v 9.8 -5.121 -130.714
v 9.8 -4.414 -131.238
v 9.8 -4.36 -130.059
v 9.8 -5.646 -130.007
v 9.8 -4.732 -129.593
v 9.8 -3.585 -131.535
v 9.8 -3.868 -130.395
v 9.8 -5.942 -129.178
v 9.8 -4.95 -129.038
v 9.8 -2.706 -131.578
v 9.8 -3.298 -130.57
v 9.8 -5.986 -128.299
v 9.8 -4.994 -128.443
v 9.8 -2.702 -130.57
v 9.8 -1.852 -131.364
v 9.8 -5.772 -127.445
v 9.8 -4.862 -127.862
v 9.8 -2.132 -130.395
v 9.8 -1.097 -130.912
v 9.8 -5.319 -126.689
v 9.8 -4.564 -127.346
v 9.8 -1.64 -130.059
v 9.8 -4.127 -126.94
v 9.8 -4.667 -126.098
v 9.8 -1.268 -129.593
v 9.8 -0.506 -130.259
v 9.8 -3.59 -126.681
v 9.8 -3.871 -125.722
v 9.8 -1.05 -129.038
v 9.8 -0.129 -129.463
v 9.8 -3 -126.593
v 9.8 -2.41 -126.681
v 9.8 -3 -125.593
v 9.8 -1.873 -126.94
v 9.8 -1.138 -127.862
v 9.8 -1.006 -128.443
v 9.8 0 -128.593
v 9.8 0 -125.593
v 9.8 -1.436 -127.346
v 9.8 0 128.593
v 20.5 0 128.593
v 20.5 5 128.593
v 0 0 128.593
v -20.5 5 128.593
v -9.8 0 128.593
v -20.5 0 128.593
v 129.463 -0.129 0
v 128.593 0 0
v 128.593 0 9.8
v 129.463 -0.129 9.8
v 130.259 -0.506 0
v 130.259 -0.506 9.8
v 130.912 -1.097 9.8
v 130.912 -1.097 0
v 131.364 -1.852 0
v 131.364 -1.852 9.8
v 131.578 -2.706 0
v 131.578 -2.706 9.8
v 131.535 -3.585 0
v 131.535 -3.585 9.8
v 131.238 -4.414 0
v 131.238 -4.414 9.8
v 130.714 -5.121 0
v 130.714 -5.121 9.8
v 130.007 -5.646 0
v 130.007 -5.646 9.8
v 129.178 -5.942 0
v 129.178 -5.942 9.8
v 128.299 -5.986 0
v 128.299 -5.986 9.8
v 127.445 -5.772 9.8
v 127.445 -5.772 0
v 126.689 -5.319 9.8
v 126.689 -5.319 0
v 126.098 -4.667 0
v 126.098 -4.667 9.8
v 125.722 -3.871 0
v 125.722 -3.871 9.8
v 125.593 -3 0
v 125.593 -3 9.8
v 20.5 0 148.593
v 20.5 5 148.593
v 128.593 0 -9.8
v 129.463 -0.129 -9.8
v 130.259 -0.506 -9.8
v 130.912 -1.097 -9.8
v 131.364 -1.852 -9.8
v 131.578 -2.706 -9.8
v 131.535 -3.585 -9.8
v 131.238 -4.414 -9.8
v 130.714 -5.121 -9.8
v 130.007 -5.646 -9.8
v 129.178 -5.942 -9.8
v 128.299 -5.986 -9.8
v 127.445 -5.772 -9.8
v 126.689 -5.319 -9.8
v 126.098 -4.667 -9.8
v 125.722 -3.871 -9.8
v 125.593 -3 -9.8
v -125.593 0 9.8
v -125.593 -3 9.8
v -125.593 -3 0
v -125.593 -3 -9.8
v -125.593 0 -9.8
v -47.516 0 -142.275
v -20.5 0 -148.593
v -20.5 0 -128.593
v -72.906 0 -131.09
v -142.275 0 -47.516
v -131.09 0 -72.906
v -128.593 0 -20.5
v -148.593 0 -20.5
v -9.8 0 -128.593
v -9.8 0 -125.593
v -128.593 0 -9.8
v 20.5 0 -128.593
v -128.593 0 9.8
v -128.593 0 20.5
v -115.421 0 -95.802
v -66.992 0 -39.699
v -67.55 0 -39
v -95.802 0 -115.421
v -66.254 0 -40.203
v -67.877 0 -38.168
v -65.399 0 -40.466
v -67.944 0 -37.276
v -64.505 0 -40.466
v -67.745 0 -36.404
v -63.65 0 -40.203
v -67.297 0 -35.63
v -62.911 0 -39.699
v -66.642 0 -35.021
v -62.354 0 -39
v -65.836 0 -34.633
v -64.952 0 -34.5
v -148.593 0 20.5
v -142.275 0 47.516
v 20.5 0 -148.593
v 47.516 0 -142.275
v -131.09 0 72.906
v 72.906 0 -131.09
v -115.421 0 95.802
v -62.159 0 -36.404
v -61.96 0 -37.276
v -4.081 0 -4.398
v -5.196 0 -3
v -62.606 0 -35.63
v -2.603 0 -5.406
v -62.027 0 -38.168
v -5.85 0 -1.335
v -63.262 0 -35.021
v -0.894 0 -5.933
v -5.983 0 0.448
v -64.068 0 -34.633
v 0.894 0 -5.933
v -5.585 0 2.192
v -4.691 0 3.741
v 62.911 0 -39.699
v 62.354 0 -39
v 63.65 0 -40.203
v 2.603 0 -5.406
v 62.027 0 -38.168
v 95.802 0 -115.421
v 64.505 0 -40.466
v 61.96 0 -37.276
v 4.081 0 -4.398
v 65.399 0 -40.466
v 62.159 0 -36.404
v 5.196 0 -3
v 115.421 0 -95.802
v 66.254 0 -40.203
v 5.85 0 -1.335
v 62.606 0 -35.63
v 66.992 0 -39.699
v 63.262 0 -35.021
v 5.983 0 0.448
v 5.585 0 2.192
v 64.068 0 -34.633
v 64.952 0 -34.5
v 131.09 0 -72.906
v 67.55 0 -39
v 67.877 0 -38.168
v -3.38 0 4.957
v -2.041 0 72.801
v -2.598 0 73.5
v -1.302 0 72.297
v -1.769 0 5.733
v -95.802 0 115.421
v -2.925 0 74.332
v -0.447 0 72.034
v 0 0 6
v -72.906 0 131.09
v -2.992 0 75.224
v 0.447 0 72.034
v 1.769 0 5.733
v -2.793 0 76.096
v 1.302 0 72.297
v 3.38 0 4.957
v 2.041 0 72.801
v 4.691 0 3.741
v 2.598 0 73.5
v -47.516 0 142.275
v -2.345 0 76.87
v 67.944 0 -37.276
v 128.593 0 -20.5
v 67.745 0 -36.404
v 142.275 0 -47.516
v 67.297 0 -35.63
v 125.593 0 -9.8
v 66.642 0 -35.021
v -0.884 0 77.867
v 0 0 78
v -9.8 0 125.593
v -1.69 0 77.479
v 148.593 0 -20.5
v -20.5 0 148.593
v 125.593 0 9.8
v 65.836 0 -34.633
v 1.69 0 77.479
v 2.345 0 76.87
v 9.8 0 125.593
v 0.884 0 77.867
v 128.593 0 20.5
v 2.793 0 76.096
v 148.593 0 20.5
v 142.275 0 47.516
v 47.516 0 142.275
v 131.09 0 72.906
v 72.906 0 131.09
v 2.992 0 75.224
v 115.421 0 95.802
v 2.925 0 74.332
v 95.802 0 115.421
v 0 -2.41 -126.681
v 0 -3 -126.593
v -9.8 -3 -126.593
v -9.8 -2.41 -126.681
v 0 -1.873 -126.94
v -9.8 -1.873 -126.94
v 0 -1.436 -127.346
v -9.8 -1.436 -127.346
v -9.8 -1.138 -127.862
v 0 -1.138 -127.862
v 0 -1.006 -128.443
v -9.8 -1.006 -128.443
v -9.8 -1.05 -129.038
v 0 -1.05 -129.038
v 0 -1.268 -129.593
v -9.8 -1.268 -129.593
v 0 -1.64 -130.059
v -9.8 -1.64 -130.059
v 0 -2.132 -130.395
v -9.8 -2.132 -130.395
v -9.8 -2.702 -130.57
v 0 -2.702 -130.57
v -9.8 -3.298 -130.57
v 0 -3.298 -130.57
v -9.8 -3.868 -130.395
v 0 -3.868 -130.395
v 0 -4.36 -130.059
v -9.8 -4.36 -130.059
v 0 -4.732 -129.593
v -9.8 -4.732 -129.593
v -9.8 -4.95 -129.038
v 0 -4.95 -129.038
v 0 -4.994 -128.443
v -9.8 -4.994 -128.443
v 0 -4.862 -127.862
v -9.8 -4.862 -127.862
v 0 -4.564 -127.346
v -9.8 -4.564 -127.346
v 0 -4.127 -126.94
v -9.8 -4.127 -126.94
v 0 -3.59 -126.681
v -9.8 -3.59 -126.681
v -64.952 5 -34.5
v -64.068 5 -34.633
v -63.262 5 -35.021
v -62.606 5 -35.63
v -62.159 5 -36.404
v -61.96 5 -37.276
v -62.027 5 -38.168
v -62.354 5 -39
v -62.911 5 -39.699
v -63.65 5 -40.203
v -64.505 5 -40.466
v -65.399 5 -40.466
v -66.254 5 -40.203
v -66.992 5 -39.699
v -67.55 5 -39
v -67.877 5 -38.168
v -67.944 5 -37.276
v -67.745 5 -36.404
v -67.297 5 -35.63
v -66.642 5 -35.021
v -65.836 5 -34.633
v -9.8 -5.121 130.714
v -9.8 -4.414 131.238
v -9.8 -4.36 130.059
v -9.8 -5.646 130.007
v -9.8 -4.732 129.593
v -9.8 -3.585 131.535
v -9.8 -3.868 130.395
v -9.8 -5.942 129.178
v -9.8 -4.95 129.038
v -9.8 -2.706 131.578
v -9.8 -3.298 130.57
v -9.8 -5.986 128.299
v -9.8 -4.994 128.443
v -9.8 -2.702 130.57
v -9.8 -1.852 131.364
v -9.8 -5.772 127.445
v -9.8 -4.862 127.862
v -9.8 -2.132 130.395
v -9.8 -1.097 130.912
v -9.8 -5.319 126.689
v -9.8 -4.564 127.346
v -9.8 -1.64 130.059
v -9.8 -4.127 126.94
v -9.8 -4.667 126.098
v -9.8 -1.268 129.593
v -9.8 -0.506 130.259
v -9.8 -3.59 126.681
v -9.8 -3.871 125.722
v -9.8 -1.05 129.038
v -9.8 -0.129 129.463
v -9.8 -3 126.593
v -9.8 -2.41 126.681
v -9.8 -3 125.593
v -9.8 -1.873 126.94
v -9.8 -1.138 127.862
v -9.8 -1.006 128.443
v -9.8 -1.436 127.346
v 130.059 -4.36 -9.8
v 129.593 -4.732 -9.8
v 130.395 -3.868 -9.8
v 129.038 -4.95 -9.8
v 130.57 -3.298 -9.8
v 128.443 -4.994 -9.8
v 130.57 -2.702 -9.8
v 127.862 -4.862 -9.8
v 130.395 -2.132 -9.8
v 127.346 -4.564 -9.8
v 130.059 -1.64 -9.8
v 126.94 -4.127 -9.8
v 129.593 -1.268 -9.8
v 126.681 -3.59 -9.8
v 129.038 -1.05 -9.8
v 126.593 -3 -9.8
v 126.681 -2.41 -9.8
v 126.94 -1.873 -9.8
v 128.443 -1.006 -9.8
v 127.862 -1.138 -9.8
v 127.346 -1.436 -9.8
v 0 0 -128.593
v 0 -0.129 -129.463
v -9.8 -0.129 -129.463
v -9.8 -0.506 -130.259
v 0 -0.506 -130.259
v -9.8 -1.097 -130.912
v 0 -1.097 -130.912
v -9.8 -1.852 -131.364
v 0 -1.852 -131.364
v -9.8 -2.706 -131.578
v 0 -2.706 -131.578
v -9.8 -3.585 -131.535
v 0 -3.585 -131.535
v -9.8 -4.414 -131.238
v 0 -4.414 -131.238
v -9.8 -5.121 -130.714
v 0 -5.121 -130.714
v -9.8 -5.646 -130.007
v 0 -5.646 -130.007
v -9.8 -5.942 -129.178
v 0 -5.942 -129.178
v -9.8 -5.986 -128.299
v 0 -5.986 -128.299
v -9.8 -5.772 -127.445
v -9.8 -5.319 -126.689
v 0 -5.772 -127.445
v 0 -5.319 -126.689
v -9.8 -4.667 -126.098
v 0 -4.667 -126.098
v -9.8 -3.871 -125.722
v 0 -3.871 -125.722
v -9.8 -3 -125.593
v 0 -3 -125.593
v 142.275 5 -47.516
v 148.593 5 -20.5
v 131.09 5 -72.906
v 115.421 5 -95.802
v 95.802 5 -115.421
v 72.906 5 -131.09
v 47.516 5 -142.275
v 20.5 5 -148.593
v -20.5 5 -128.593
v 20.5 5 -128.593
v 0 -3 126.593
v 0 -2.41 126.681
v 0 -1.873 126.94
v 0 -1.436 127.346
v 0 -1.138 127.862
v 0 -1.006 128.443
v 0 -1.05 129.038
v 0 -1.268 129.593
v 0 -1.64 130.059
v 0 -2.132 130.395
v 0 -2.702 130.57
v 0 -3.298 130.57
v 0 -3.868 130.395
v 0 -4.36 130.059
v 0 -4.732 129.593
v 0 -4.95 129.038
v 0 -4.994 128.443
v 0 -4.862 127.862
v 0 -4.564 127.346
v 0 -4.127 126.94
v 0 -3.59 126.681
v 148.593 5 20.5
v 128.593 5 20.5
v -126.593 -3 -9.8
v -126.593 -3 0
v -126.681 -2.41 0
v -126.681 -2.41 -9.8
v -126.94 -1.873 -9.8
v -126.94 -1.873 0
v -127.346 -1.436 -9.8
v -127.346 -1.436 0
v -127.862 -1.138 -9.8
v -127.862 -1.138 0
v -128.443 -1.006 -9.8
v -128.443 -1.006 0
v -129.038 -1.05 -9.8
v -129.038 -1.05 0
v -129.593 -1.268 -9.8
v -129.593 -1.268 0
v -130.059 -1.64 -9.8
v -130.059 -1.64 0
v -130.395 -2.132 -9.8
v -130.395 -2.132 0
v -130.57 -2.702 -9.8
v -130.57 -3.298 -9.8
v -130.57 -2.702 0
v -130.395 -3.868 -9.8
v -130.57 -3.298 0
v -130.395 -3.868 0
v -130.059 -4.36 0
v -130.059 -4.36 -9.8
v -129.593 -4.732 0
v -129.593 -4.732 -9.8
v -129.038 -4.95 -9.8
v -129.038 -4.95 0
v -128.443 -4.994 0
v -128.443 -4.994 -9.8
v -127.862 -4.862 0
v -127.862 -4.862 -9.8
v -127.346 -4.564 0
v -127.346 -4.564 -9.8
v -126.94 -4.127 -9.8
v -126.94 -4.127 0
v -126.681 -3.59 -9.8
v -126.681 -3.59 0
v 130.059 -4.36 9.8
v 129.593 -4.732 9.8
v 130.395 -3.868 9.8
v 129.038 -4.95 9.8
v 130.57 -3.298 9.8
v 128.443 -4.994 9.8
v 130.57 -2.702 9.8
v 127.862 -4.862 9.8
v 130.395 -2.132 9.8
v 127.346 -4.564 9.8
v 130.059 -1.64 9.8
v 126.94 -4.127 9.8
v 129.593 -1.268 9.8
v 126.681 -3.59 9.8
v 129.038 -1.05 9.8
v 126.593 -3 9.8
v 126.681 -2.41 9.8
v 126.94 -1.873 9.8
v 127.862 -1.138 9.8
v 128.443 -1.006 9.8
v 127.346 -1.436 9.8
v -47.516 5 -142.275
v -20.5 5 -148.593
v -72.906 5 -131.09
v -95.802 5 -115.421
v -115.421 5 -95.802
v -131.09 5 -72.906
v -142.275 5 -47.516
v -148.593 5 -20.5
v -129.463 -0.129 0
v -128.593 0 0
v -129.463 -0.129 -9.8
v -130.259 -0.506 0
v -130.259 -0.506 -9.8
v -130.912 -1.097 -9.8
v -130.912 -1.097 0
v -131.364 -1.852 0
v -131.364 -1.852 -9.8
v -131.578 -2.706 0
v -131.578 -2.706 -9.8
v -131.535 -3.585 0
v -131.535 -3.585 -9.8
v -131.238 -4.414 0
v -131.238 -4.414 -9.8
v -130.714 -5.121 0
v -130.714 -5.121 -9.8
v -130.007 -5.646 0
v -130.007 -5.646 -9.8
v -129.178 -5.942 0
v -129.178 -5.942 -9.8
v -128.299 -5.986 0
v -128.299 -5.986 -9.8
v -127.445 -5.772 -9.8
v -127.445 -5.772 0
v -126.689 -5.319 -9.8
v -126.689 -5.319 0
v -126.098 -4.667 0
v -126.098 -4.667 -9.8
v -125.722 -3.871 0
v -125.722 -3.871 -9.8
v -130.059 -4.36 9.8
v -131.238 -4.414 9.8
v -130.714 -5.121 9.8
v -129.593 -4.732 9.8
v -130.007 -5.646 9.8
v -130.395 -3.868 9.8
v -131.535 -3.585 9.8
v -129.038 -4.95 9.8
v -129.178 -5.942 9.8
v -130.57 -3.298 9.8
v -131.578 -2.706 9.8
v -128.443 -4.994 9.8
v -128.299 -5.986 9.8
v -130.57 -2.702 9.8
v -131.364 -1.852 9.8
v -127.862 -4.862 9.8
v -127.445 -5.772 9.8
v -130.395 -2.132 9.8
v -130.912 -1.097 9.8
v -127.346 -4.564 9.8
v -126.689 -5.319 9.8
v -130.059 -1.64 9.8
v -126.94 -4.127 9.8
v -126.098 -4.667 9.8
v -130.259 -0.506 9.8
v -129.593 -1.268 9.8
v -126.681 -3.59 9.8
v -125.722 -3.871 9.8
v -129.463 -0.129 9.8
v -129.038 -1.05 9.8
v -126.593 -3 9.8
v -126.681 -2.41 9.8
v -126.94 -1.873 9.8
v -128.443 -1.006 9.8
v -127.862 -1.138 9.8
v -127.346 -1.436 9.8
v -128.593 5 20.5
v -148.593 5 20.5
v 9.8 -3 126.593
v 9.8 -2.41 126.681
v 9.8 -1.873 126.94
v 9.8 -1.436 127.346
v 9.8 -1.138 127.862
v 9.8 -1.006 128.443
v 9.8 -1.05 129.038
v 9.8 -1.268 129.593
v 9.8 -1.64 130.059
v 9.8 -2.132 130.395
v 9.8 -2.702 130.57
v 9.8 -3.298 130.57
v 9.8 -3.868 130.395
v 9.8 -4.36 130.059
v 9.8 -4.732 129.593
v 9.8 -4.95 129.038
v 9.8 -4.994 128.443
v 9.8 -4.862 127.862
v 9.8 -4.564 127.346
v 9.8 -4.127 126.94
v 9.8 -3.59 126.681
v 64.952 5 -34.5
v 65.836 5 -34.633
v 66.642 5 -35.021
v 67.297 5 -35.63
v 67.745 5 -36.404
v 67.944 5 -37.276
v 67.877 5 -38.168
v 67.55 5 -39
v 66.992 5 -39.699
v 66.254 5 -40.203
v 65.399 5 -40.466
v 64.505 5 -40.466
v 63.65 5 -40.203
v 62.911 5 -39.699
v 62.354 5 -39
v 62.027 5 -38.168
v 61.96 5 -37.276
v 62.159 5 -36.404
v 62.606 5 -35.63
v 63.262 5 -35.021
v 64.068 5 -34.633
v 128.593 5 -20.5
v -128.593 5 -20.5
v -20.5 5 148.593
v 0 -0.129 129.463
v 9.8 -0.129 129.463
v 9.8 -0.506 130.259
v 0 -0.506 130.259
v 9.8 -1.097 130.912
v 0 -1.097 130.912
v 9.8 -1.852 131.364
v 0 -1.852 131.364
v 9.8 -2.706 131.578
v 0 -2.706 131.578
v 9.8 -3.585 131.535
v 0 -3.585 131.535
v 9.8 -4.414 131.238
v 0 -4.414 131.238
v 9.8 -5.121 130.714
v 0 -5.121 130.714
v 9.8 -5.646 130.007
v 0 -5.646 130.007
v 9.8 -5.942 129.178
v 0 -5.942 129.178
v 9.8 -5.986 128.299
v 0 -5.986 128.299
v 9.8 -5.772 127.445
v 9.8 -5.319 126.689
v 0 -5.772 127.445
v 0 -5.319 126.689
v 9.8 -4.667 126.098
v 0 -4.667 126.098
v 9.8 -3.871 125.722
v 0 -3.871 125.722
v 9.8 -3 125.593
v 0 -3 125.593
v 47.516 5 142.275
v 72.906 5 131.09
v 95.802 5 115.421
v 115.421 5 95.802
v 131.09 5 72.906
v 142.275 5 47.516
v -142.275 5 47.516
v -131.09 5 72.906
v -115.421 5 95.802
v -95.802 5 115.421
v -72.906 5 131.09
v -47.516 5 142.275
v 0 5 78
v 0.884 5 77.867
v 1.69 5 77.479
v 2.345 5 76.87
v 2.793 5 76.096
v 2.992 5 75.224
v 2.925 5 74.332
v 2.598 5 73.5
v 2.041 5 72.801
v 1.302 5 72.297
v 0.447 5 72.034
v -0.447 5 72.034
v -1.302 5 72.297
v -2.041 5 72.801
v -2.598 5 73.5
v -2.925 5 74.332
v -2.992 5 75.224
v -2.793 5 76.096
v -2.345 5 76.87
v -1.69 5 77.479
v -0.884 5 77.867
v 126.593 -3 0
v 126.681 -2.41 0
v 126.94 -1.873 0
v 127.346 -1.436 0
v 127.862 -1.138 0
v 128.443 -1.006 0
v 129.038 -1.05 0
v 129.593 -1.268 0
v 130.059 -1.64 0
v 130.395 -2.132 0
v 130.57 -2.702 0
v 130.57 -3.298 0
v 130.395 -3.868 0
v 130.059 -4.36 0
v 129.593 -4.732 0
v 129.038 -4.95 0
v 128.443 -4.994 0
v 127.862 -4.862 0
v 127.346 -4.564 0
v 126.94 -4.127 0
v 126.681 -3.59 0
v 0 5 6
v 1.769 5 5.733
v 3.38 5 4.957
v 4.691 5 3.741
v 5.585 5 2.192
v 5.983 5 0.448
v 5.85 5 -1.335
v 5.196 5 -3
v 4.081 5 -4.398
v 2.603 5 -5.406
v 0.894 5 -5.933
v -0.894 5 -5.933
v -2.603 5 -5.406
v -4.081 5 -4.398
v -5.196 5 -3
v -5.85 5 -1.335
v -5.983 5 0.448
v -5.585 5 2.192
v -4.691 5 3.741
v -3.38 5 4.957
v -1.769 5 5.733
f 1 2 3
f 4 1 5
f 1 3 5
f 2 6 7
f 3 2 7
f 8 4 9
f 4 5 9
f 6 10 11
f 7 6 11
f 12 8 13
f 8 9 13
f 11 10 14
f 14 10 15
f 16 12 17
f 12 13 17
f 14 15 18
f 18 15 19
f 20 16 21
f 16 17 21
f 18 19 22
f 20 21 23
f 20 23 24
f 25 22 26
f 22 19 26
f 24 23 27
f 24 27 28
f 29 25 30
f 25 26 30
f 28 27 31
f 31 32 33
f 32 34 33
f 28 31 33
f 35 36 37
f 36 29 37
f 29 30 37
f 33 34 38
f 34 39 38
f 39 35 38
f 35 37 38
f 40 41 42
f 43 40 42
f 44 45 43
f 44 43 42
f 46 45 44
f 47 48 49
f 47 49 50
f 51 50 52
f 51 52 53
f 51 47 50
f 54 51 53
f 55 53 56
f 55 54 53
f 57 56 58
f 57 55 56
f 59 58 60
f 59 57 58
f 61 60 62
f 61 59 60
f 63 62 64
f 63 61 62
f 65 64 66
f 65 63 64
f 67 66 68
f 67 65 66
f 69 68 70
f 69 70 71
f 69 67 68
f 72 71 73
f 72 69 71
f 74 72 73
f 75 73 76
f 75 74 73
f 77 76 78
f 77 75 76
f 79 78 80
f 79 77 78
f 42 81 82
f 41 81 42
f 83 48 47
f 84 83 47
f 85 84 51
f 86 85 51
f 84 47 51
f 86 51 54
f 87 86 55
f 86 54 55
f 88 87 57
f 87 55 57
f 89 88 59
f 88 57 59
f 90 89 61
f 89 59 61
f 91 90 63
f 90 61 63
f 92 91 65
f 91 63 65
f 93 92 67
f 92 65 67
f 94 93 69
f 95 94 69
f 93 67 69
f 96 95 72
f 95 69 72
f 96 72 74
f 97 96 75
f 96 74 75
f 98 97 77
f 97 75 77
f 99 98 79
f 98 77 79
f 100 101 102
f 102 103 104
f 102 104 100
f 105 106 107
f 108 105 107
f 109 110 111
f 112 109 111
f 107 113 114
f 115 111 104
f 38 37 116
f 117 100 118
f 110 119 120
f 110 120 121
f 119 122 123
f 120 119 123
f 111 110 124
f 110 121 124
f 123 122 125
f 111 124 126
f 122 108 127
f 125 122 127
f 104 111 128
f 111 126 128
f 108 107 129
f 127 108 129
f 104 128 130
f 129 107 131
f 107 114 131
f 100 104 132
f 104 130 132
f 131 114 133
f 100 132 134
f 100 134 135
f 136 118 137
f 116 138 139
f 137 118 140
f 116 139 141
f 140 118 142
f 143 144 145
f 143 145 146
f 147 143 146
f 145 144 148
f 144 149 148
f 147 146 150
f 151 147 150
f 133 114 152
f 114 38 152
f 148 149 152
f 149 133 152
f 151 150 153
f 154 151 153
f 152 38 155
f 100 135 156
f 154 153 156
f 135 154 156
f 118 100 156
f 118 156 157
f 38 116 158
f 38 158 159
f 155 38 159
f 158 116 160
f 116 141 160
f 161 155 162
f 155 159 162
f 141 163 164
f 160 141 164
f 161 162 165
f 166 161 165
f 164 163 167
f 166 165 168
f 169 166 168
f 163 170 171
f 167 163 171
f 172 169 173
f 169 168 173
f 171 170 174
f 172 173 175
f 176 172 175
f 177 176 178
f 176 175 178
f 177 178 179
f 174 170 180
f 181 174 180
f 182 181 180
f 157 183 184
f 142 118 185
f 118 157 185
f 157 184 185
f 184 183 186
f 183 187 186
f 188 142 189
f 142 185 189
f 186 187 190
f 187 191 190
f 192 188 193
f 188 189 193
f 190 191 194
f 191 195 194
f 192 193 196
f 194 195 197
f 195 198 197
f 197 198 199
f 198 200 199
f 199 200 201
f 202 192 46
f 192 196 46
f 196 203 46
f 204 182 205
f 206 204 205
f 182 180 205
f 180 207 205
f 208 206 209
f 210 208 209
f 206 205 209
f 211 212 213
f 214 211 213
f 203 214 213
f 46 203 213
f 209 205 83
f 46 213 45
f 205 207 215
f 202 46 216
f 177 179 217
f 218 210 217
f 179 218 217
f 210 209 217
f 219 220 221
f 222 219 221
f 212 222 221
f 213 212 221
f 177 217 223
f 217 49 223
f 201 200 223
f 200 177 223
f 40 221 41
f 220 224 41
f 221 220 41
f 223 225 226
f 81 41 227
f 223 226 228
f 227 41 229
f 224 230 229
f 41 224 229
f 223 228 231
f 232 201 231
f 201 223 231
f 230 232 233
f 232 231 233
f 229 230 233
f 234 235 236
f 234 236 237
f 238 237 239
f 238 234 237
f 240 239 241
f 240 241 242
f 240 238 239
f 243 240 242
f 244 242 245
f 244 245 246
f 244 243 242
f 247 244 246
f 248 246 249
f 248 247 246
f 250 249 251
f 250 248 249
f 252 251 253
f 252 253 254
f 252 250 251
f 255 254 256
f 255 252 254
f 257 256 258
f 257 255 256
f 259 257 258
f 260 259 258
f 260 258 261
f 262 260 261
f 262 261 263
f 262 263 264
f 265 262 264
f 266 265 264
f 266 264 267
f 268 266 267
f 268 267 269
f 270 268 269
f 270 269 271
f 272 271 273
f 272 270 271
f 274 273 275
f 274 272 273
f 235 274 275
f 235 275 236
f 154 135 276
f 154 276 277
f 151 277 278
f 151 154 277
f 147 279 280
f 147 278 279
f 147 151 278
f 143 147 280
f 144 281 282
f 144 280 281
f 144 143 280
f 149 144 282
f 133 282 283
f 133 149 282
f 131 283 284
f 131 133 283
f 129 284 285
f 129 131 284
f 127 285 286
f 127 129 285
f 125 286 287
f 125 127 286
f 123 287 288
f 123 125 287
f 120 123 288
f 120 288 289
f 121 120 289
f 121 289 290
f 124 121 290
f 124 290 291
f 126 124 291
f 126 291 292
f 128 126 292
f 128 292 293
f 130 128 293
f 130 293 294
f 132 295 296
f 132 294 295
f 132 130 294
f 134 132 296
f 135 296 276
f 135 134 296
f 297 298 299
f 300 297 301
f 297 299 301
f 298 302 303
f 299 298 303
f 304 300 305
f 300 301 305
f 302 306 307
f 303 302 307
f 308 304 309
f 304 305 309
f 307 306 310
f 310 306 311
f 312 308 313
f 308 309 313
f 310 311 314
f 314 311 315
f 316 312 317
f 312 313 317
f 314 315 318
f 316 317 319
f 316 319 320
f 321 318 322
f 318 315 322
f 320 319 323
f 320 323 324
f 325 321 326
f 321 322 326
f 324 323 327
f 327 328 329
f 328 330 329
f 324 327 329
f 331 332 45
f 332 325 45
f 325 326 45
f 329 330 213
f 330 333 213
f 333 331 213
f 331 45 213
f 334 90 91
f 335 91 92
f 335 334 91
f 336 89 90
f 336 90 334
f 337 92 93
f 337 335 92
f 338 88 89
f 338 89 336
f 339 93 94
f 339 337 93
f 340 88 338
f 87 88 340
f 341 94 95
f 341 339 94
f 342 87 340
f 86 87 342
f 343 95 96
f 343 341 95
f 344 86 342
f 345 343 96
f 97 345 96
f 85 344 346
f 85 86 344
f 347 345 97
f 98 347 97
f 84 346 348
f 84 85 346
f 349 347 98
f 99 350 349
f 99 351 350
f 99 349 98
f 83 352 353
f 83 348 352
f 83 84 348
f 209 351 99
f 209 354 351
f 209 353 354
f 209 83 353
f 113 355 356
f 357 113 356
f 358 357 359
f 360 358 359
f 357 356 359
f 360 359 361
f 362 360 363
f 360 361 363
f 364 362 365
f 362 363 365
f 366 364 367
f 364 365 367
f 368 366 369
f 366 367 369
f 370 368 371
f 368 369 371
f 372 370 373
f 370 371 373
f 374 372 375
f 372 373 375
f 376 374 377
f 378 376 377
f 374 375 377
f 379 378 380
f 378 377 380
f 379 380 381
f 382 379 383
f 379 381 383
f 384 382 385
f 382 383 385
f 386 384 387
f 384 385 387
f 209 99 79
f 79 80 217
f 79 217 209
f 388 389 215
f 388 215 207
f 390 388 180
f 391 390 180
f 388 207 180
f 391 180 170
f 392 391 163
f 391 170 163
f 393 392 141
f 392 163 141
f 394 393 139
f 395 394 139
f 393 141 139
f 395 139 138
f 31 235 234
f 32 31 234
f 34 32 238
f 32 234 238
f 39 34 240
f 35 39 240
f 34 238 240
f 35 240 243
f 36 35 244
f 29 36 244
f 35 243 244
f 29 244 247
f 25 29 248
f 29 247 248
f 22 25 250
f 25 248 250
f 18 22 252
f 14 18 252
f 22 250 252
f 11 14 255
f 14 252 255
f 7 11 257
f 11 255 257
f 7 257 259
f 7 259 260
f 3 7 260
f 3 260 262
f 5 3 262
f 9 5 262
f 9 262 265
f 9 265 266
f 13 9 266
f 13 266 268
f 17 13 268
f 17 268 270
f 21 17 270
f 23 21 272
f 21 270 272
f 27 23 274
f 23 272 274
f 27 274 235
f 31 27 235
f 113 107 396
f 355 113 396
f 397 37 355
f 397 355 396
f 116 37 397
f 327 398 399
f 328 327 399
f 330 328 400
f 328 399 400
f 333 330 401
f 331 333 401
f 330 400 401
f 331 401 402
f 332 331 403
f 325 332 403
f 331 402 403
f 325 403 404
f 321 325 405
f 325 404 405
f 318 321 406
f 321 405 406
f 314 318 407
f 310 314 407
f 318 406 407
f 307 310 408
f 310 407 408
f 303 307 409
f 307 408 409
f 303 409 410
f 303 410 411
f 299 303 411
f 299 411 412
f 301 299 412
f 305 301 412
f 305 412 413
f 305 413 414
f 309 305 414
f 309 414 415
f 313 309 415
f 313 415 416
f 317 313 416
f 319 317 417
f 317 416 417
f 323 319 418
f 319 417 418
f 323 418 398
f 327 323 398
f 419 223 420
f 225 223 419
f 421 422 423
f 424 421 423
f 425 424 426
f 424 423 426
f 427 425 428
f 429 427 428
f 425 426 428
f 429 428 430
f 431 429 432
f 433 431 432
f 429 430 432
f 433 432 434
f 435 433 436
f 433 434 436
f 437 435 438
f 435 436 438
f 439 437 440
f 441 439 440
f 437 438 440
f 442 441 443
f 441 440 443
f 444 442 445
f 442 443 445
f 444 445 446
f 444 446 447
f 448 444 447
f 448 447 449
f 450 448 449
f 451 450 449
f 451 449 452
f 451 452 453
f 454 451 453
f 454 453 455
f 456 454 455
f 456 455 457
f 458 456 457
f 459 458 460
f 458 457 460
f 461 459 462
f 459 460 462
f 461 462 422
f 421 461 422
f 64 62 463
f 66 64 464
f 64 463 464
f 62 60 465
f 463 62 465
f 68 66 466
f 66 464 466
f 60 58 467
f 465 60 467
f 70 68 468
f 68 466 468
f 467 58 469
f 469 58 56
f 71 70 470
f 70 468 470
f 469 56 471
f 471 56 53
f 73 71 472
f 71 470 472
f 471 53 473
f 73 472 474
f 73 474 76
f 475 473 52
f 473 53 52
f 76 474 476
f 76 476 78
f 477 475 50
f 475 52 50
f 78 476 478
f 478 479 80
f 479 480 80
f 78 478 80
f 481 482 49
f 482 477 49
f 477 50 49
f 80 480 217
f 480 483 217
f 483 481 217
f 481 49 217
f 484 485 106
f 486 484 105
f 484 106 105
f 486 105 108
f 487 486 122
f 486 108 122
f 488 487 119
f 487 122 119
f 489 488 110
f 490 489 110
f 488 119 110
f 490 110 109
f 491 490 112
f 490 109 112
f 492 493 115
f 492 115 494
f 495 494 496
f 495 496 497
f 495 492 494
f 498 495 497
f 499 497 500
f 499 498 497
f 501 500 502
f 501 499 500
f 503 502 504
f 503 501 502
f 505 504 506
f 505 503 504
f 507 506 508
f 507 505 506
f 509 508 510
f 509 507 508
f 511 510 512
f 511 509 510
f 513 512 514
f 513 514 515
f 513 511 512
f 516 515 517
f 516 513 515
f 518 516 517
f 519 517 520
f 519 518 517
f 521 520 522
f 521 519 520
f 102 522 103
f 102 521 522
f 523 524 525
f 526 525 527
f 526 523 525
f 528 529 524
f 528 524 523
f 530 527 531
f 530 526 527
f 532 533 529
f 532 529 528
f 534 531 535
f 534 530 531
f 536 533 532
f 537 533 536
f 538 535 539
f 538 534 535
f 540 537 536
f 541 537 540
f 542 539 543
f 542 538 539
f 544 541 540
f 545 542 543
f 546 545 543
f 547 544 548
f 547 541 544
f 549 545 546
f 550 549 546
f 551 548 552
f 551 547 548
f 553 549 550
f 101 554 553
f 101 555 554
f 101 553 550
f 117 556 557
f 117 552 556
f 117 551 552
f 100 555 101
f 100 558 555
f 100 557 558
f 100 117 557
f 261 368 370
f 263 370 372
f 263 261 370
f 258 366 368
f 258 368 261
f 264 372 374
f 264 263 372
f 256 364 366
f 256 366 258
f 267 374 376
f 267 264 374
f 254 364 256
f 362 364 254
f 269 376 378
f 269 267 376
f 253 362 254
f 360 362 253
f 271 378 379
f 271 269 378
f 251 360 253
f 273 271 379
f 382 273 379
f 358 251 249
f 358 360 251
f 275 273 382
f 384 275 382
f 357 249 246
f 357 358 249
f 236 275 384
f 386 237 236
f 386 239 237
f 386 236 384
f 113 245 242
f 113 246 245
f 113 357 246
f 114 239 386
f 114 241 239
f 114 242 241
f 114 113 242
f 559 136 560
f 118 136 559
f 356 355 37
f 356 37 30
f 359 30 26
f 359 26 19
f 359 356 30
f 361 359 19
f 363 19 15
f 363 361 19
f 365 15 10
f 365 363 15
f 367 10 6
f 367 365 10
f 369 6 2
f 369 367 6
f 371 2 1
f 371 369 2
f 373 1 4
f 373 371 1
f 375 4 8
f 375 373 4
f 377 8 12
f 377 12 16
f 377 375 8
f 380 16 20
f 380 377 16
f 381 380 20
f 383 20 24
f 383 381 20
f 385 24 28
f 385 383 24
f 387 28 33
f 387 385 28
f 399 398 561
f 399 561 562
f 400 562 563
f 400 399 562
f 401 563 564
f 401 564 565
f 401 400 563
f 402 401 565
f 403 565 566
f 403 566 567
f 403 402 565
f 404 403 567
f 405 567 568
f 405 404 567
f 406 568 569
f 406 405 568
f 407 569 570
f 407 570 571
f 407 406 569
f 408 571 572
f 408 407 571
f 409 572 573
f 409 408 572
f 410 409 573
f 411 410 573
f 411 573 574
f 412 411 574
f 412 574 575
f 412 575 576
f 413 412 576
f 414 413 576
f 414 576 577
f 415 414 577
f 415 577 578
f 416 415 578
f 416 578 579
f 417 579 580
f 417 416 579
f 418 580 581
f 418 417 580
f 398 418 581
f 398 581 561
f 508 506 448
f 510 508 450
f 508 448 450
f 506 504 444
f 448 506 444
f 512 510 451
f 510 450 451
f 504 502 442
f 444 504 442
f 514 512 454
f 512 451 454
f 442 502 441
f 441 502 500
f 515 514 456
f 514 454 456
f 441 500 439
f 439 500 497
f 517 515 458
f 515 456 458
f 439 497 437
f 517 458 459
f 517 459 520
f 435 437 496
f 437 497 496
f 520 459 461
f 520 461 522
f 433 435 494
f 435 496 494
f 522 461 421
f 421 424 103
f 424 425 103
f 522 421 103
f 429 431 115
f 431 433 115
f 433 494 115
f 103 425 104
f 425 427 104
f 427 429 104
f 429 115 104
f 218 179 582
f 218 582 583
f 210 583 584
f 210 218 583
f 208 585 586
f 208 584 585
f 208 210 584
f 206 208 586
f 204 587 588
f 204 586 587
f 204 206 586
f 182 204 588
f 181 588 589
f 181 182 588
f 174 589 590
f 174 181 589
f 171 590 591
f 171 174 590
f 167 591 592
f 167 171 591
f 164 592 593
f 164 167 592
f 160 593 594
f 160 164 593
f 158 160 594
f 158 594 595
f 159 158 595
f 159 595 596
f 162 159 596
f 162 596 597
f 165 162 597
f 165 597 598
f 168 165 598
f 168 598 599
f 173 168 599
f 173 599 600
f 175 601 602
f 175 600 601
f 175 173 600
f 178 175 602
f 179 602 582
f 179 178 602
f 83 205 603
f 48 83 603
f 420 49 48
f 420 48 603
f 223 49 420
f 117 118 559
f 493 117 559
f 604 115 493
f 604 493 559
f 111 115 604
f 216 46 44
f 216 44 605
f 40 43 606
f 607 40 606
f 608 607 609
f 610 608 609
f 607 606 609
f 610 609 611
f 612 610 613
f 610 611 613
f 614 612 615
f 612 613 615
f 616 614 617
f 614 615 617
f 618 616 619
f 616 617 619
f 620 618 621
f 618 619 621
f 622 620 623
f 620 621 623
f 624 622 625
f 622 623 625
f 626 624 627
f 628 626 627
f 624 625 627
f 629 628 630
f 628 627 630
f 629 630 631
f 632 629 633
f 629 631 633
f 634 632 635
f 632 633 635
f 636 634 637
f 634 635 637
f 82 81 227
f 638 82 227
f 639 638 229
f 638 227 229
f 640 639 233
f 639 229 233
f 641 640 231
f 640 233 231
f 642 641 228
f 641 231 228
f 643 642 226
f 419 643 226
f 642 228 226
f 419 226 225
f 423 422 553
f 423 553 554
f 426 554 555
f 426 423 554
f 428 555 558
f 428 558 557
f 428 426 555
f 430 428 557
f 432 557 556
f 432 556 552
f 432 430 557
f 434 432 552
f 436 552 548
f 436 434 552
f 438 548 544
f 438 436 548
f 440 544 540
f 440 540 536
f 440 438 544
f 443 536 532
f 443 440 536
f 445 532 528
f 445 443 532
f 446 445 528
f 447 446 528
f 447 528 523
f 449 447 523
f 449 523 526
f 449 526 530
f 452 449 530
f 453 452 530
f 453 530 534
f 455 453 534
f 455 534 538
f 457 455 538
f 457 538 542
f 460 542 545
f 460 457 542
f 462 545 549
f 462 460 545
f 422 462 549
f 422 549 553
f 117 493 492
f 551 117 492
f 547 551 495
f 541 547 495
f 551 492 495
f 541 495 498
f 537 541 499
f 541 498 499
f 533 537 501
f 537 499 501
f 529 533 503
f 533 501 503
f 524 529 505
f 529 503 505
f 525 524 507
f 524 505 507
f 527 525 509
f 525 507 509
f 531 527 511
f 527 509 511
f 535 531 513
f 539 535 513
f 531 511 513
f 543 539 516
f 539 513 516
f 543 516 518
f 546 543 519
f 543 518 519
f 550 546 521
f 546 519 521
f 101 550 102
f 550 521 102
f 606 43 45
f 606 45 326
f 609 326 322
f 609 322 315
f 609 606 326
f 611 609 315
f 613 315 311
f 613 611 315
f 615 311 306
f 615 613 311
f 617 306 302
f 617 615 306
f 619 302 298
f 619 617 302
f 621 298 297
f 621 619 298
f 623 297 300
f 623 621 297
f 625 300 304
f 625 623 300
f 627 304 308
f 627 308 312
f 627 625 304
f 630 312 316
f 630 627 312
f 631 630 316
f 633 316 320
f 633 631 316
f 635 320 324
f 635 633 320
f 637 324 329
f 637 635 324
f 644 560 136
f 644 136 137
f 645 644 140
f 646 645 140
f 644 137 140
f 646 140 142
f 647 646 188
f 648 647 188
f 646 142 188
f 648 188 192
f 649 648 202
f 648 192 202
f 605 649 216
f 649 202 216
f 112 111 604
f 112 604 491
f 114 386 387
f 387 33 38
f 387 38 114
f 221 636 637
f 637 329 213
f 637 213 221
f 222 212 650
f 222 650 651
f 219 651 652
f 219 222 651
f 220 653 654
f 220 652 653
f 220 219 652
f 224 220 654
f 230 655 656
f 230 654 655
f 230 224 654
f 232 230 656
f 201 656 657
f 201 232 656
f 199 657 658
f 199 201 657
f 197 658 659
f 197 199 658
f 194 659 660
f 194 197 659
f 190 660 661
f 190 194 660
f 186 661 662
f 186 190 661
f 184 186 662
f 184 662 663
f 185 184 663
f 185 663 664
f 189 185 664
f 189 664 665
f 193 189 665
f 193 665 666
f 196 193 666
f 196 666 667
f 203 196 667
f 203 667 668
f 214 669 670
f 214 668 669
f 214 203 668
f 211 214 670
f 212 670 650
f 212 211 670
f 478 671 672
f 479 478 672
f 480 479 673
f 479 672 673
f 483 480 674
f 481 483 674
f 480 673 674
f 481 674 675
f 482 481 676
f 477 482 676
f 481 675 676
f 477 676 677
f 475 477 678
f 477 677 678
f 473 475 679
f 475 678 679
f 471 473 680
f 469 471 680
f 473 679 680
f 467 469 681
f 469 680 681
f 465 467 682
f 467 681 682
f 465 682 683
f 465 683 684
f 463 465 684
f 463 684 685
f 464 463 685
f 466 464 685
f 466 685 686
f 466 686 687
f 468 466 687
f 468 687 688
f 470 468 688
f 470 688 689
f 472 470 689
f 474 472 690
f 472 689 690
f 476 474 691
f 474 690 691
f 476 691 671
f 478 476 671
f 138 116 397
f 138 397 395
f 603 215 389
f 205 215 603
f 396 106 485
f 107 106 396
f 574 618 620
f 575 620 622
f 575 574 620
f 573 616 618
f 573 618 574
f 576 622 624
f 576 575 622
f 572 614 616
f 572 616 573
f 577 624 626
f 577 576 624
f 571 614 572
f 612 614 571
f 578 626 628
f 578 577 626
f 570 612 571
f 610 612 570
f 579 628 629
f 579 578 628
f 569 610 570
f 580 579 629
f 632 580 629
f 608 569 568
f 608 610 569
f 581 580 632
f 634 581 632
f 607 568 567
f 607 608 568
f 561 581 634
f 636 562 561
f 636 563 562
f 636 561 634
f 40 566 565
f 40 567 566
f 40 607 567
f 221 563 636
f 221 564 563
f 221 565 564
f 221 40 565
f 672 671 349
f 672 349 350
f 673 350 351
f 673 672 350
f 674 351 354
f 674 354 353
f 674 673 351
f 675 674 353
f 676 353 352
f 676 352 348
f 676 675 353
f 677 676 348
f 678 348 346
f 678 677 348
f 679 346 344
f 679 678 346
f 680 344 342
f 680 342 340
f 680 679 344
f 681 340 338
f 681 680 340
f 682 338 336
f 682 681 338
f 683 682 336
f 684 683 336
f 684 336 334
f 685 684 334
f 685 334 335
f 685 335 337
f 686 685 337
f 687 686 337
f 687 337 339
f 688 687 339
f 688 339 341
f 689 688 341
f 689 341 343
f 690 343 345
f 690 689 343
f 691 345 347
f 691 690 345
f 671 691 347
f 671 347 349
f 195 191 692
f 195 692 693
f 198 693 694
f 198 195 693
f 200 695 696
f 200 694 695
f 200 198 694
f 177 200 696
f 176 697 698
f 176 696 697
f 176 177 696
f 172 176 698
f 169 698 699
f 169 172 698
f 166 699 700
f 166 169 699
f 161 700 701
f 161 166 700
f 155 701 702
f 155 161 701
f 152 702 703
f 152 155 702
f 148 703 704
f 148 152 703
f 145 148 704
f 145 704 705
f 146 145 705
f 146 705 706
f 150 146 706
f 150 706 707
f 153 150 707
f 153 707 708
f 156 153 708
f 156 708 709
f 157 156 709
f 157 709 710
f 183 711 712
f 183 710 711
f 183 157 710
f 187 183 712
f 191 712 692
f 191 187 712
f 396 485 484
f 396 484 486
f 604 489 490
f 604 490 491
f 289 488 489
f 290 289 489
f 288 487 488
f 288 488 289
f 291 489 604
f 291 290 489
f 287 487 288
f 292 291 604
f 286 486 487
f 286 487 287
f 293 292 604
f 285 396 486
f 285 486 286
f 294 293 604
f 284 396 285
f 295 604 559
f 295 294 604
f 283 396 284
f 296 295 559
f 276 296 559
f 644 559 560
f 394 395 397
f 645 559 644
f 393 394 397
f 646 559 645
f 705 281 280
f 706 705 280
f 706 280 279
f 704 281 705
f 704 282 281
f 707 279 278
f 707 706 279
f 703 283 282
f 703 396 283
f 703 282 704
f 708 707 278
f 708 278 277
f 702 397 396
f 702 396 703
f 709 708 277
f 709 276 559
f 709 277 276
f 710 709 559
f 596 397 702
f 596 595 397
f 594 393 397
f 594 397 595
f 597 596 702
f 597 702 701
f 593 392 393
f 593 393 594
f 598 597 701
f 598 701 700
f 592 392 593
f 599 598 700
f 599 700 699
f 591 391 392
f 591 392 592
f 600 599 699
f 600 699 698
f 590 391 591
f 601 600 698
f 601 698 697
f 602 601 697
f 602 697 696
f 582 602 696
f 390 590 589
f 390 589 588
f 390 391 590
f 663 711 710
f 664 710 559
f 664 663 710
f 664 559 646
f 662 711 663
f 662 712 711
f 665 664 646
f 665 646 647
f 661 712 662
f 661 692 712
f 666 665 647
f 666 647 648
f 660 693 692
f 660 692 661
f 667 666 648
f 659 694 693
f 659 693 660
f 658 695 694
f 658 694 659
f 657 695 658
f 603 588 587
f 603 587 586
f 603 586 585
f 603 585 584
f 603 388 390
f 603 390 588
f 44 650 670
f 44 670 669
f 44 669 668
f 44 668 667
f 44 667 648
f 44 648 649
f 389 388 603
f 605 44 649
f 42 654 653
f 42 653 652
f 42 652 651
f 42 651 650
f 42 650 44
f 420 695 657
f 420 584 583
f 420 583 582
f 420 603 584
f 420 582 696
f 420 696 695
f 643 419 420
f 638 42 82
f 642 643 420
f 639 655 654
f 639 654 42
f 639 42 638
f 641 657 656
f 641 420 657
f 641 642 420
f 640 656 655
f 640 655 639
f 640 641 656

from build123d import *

# Parameters (mm, degrees)
SKETCH1_R               = 150
BOSS_EXTRUDE1_DEPTH     = 5
CUT_EXTRUDE1_DEPTH      = 213.190951739
CUT_EXTRUDE1_DEPTH_BACK = 213.190951739
SKETCH2_R               = 6
CUT_EXTRUDE2_DEPTH      = 213.190951739
CUT_EXTRUDE2_DEPTH_BACK = 213.190951739
SKETCH3_R               = 3
CUT_EXTRUDE3_DEPTH      = 213.190951739
CUT_EXTRUDE3_DEPTH_BACK = 213.190951739
SKETCH5_R               = 3
SKETCH5_R_2             = 2
BOSS_EXTRUDE2_DEPTH     = 9.8
CIRPATTERN1_COUNT       = 4


with BuildPart() as part:
    # Sketch1 → Boss-Extrude1 (new body)
    with BuildSketch(Plane(origin=(0, 0, 0), x_dir=(1, 0, 0), z_dir=(0, 1, 0))):
        with Locations(Location((0, 0, 0), (0, 0, 270))):
            Circle(SKETCH1_R)
    extrude(amount=BOSS_EXTRUDE1_DEPTH)

    # Sketch2 → Cut-Extrude1 (cut, two sides: drawn at the far end of the back side and taken through both)
    with BuildSketch(Plane(origin=(0, 5, 0), x_dir=(1, 0, 0), z_dir=(0, 1, 0)).offset(-CUT_EXTRUDE1_DEPTH_BACK)):
        with Locations(Location((0, 0, 0), (0, 0, 270))):
            Circle(SKETCH2_R)
    extrude(amount=CUT_EXTRUDE1_DEPTH + CUT_EXTRUDE1_DEPTH_BACK, mode=Mode.SUBTRACT)

    # Sketch3 → Cut-Extrude2 (cut, two sides: drawn at the far end of the back side and taken through both)
    with BuildSketch(Plane(origin=(0, 5, 0), x_dir=(1, 0, 0), z_dir=(0, 1, 0)).offset(-CUT_EXTRUDE2_DEPTH_BACK)):
        with Locations(Location((-64.951905284, 37.5, 0), (0, 0, 270))):
            Circle(SKETCH3_R)
        with Locations(Location((64.951905284, 37.5, 0), (0, 0, 270))):
            Circle(SKETCH3_R)
        with Locations(Location((0, -75, 0), (0, 0, 270))):
            Circle(SKETCH3_R)
    extrude(amount=CUT_EXTRUDE2_DEPTH + CUT_EXTRUDE2_DEPTH_BACK, mode=Mode.SUBTRACT)

    # Sketch4 → Cut-Extrude3 (cut, two sides: drawn at the far end of the back side and taken through both)
    with BuildSketch(Plane(origin=(0, 5, 0), x_dir=(1, 0, 0), z_dir=(0, 1, 0)).offset(-CUT_EXTRUDE3_DEPTH_BACK)):
        with BuildLine():
            ThreePointArc((20.5, 148.592563744), (0, 150), (-20.5, 148.592563744))
            Line((-20.5, 148.592563744), (-20.5, 128.592563744))
            Line((-20.5, 128.592563744), (20.5, 128.592563744))
            Line((20.5, 128.592563744), (20.5, 148.592563744))
        make_face()
        with BuildLine():
            ThreePointArc((-148.592563744, 20.5), (-150, 0), (-148.592563744, -20.5))
            Line((-148.592563744, -20.5), (-128.592563744, -20.5))
            Line((-128.592563744, -20.5), (-128.592563744, 20.5))
            Line((-128.592563744, 20.5), (-148.592563744, 20.5))
        make_face()
        with BuildLine():
            Line((128.592563744, -20.5), (148.592563744, -20.5))
            ThreePointArc((148.592563744, -20.5), (149.647727282, -10.274128635), (150, 0))
            ThreePointArc((150, 0), (149.647727282, 10.274128635), (148.592563744, 20.5))
            Line((148.592563744, 20.5), (128.592563744, 20.5))
            Line((128.592563744, 20.5), (128.592563744, -20.5))
        make_face()
        with BuildLine():
            Line((-20.5, -128.592563744), (-20.5, -148.592563744))
            ThreePointArc((-20.5, -148.592563744), (0, -150), (20.5, -148.592563744))
            Line((20.5, -148.592563744), (20.5, -128.592563744))
            Line((20.5, -128.592563744), (-20.5, -128.592563744))
        make_face()
    extrude(amount=CUT_EXTRUDE3_DEPTH + CUT_EXTRUDE3_DEPTH_BACK, mode=Mode.SUBTRACT)

    # Sketch5 → Boss-Extrude2 (add, symmetric)
    # profile 1 of 2: a face of its own
    with BuildSketch(Plane.XY):
        with BuildLine():
            Line((-125.592563744, 0), (-128.592563744, 0))
            ThreePointArc((-128.592563744, 0), (-126.4712434, -0.878679656), (-125.592563744, -3))
            Line((-125.592563744, -3), (-125.592563744, 0))
        make_face()
    # profile 2 of 2: a face of its own
    with BuildSketch(Plane.XY):
        with Locations((-128.592563744, -3)):
            Circle(SKETCH5_R)
        with Locations((-128.592563744, -3)):
            Circle(SKETCH5_R_2, mode=Mode.SUBTRACT)
    boss_extrude2 = extrude(amount=BOSS_EXTRUDE2_DEPTH, both=True)

    # CirPattern1: Boss-Extrude2 ×4 about axis
    cirpattern1_axis = Axis((0, 0, 0), (0, 1, 0))
    for i in range(1, CIRPATTERN1_COUNT):
        add(boss_extrude2.rotate(cirpattern1_axis, i * 360 / CIRPATTERN1_COUNT))


solid = part.part
